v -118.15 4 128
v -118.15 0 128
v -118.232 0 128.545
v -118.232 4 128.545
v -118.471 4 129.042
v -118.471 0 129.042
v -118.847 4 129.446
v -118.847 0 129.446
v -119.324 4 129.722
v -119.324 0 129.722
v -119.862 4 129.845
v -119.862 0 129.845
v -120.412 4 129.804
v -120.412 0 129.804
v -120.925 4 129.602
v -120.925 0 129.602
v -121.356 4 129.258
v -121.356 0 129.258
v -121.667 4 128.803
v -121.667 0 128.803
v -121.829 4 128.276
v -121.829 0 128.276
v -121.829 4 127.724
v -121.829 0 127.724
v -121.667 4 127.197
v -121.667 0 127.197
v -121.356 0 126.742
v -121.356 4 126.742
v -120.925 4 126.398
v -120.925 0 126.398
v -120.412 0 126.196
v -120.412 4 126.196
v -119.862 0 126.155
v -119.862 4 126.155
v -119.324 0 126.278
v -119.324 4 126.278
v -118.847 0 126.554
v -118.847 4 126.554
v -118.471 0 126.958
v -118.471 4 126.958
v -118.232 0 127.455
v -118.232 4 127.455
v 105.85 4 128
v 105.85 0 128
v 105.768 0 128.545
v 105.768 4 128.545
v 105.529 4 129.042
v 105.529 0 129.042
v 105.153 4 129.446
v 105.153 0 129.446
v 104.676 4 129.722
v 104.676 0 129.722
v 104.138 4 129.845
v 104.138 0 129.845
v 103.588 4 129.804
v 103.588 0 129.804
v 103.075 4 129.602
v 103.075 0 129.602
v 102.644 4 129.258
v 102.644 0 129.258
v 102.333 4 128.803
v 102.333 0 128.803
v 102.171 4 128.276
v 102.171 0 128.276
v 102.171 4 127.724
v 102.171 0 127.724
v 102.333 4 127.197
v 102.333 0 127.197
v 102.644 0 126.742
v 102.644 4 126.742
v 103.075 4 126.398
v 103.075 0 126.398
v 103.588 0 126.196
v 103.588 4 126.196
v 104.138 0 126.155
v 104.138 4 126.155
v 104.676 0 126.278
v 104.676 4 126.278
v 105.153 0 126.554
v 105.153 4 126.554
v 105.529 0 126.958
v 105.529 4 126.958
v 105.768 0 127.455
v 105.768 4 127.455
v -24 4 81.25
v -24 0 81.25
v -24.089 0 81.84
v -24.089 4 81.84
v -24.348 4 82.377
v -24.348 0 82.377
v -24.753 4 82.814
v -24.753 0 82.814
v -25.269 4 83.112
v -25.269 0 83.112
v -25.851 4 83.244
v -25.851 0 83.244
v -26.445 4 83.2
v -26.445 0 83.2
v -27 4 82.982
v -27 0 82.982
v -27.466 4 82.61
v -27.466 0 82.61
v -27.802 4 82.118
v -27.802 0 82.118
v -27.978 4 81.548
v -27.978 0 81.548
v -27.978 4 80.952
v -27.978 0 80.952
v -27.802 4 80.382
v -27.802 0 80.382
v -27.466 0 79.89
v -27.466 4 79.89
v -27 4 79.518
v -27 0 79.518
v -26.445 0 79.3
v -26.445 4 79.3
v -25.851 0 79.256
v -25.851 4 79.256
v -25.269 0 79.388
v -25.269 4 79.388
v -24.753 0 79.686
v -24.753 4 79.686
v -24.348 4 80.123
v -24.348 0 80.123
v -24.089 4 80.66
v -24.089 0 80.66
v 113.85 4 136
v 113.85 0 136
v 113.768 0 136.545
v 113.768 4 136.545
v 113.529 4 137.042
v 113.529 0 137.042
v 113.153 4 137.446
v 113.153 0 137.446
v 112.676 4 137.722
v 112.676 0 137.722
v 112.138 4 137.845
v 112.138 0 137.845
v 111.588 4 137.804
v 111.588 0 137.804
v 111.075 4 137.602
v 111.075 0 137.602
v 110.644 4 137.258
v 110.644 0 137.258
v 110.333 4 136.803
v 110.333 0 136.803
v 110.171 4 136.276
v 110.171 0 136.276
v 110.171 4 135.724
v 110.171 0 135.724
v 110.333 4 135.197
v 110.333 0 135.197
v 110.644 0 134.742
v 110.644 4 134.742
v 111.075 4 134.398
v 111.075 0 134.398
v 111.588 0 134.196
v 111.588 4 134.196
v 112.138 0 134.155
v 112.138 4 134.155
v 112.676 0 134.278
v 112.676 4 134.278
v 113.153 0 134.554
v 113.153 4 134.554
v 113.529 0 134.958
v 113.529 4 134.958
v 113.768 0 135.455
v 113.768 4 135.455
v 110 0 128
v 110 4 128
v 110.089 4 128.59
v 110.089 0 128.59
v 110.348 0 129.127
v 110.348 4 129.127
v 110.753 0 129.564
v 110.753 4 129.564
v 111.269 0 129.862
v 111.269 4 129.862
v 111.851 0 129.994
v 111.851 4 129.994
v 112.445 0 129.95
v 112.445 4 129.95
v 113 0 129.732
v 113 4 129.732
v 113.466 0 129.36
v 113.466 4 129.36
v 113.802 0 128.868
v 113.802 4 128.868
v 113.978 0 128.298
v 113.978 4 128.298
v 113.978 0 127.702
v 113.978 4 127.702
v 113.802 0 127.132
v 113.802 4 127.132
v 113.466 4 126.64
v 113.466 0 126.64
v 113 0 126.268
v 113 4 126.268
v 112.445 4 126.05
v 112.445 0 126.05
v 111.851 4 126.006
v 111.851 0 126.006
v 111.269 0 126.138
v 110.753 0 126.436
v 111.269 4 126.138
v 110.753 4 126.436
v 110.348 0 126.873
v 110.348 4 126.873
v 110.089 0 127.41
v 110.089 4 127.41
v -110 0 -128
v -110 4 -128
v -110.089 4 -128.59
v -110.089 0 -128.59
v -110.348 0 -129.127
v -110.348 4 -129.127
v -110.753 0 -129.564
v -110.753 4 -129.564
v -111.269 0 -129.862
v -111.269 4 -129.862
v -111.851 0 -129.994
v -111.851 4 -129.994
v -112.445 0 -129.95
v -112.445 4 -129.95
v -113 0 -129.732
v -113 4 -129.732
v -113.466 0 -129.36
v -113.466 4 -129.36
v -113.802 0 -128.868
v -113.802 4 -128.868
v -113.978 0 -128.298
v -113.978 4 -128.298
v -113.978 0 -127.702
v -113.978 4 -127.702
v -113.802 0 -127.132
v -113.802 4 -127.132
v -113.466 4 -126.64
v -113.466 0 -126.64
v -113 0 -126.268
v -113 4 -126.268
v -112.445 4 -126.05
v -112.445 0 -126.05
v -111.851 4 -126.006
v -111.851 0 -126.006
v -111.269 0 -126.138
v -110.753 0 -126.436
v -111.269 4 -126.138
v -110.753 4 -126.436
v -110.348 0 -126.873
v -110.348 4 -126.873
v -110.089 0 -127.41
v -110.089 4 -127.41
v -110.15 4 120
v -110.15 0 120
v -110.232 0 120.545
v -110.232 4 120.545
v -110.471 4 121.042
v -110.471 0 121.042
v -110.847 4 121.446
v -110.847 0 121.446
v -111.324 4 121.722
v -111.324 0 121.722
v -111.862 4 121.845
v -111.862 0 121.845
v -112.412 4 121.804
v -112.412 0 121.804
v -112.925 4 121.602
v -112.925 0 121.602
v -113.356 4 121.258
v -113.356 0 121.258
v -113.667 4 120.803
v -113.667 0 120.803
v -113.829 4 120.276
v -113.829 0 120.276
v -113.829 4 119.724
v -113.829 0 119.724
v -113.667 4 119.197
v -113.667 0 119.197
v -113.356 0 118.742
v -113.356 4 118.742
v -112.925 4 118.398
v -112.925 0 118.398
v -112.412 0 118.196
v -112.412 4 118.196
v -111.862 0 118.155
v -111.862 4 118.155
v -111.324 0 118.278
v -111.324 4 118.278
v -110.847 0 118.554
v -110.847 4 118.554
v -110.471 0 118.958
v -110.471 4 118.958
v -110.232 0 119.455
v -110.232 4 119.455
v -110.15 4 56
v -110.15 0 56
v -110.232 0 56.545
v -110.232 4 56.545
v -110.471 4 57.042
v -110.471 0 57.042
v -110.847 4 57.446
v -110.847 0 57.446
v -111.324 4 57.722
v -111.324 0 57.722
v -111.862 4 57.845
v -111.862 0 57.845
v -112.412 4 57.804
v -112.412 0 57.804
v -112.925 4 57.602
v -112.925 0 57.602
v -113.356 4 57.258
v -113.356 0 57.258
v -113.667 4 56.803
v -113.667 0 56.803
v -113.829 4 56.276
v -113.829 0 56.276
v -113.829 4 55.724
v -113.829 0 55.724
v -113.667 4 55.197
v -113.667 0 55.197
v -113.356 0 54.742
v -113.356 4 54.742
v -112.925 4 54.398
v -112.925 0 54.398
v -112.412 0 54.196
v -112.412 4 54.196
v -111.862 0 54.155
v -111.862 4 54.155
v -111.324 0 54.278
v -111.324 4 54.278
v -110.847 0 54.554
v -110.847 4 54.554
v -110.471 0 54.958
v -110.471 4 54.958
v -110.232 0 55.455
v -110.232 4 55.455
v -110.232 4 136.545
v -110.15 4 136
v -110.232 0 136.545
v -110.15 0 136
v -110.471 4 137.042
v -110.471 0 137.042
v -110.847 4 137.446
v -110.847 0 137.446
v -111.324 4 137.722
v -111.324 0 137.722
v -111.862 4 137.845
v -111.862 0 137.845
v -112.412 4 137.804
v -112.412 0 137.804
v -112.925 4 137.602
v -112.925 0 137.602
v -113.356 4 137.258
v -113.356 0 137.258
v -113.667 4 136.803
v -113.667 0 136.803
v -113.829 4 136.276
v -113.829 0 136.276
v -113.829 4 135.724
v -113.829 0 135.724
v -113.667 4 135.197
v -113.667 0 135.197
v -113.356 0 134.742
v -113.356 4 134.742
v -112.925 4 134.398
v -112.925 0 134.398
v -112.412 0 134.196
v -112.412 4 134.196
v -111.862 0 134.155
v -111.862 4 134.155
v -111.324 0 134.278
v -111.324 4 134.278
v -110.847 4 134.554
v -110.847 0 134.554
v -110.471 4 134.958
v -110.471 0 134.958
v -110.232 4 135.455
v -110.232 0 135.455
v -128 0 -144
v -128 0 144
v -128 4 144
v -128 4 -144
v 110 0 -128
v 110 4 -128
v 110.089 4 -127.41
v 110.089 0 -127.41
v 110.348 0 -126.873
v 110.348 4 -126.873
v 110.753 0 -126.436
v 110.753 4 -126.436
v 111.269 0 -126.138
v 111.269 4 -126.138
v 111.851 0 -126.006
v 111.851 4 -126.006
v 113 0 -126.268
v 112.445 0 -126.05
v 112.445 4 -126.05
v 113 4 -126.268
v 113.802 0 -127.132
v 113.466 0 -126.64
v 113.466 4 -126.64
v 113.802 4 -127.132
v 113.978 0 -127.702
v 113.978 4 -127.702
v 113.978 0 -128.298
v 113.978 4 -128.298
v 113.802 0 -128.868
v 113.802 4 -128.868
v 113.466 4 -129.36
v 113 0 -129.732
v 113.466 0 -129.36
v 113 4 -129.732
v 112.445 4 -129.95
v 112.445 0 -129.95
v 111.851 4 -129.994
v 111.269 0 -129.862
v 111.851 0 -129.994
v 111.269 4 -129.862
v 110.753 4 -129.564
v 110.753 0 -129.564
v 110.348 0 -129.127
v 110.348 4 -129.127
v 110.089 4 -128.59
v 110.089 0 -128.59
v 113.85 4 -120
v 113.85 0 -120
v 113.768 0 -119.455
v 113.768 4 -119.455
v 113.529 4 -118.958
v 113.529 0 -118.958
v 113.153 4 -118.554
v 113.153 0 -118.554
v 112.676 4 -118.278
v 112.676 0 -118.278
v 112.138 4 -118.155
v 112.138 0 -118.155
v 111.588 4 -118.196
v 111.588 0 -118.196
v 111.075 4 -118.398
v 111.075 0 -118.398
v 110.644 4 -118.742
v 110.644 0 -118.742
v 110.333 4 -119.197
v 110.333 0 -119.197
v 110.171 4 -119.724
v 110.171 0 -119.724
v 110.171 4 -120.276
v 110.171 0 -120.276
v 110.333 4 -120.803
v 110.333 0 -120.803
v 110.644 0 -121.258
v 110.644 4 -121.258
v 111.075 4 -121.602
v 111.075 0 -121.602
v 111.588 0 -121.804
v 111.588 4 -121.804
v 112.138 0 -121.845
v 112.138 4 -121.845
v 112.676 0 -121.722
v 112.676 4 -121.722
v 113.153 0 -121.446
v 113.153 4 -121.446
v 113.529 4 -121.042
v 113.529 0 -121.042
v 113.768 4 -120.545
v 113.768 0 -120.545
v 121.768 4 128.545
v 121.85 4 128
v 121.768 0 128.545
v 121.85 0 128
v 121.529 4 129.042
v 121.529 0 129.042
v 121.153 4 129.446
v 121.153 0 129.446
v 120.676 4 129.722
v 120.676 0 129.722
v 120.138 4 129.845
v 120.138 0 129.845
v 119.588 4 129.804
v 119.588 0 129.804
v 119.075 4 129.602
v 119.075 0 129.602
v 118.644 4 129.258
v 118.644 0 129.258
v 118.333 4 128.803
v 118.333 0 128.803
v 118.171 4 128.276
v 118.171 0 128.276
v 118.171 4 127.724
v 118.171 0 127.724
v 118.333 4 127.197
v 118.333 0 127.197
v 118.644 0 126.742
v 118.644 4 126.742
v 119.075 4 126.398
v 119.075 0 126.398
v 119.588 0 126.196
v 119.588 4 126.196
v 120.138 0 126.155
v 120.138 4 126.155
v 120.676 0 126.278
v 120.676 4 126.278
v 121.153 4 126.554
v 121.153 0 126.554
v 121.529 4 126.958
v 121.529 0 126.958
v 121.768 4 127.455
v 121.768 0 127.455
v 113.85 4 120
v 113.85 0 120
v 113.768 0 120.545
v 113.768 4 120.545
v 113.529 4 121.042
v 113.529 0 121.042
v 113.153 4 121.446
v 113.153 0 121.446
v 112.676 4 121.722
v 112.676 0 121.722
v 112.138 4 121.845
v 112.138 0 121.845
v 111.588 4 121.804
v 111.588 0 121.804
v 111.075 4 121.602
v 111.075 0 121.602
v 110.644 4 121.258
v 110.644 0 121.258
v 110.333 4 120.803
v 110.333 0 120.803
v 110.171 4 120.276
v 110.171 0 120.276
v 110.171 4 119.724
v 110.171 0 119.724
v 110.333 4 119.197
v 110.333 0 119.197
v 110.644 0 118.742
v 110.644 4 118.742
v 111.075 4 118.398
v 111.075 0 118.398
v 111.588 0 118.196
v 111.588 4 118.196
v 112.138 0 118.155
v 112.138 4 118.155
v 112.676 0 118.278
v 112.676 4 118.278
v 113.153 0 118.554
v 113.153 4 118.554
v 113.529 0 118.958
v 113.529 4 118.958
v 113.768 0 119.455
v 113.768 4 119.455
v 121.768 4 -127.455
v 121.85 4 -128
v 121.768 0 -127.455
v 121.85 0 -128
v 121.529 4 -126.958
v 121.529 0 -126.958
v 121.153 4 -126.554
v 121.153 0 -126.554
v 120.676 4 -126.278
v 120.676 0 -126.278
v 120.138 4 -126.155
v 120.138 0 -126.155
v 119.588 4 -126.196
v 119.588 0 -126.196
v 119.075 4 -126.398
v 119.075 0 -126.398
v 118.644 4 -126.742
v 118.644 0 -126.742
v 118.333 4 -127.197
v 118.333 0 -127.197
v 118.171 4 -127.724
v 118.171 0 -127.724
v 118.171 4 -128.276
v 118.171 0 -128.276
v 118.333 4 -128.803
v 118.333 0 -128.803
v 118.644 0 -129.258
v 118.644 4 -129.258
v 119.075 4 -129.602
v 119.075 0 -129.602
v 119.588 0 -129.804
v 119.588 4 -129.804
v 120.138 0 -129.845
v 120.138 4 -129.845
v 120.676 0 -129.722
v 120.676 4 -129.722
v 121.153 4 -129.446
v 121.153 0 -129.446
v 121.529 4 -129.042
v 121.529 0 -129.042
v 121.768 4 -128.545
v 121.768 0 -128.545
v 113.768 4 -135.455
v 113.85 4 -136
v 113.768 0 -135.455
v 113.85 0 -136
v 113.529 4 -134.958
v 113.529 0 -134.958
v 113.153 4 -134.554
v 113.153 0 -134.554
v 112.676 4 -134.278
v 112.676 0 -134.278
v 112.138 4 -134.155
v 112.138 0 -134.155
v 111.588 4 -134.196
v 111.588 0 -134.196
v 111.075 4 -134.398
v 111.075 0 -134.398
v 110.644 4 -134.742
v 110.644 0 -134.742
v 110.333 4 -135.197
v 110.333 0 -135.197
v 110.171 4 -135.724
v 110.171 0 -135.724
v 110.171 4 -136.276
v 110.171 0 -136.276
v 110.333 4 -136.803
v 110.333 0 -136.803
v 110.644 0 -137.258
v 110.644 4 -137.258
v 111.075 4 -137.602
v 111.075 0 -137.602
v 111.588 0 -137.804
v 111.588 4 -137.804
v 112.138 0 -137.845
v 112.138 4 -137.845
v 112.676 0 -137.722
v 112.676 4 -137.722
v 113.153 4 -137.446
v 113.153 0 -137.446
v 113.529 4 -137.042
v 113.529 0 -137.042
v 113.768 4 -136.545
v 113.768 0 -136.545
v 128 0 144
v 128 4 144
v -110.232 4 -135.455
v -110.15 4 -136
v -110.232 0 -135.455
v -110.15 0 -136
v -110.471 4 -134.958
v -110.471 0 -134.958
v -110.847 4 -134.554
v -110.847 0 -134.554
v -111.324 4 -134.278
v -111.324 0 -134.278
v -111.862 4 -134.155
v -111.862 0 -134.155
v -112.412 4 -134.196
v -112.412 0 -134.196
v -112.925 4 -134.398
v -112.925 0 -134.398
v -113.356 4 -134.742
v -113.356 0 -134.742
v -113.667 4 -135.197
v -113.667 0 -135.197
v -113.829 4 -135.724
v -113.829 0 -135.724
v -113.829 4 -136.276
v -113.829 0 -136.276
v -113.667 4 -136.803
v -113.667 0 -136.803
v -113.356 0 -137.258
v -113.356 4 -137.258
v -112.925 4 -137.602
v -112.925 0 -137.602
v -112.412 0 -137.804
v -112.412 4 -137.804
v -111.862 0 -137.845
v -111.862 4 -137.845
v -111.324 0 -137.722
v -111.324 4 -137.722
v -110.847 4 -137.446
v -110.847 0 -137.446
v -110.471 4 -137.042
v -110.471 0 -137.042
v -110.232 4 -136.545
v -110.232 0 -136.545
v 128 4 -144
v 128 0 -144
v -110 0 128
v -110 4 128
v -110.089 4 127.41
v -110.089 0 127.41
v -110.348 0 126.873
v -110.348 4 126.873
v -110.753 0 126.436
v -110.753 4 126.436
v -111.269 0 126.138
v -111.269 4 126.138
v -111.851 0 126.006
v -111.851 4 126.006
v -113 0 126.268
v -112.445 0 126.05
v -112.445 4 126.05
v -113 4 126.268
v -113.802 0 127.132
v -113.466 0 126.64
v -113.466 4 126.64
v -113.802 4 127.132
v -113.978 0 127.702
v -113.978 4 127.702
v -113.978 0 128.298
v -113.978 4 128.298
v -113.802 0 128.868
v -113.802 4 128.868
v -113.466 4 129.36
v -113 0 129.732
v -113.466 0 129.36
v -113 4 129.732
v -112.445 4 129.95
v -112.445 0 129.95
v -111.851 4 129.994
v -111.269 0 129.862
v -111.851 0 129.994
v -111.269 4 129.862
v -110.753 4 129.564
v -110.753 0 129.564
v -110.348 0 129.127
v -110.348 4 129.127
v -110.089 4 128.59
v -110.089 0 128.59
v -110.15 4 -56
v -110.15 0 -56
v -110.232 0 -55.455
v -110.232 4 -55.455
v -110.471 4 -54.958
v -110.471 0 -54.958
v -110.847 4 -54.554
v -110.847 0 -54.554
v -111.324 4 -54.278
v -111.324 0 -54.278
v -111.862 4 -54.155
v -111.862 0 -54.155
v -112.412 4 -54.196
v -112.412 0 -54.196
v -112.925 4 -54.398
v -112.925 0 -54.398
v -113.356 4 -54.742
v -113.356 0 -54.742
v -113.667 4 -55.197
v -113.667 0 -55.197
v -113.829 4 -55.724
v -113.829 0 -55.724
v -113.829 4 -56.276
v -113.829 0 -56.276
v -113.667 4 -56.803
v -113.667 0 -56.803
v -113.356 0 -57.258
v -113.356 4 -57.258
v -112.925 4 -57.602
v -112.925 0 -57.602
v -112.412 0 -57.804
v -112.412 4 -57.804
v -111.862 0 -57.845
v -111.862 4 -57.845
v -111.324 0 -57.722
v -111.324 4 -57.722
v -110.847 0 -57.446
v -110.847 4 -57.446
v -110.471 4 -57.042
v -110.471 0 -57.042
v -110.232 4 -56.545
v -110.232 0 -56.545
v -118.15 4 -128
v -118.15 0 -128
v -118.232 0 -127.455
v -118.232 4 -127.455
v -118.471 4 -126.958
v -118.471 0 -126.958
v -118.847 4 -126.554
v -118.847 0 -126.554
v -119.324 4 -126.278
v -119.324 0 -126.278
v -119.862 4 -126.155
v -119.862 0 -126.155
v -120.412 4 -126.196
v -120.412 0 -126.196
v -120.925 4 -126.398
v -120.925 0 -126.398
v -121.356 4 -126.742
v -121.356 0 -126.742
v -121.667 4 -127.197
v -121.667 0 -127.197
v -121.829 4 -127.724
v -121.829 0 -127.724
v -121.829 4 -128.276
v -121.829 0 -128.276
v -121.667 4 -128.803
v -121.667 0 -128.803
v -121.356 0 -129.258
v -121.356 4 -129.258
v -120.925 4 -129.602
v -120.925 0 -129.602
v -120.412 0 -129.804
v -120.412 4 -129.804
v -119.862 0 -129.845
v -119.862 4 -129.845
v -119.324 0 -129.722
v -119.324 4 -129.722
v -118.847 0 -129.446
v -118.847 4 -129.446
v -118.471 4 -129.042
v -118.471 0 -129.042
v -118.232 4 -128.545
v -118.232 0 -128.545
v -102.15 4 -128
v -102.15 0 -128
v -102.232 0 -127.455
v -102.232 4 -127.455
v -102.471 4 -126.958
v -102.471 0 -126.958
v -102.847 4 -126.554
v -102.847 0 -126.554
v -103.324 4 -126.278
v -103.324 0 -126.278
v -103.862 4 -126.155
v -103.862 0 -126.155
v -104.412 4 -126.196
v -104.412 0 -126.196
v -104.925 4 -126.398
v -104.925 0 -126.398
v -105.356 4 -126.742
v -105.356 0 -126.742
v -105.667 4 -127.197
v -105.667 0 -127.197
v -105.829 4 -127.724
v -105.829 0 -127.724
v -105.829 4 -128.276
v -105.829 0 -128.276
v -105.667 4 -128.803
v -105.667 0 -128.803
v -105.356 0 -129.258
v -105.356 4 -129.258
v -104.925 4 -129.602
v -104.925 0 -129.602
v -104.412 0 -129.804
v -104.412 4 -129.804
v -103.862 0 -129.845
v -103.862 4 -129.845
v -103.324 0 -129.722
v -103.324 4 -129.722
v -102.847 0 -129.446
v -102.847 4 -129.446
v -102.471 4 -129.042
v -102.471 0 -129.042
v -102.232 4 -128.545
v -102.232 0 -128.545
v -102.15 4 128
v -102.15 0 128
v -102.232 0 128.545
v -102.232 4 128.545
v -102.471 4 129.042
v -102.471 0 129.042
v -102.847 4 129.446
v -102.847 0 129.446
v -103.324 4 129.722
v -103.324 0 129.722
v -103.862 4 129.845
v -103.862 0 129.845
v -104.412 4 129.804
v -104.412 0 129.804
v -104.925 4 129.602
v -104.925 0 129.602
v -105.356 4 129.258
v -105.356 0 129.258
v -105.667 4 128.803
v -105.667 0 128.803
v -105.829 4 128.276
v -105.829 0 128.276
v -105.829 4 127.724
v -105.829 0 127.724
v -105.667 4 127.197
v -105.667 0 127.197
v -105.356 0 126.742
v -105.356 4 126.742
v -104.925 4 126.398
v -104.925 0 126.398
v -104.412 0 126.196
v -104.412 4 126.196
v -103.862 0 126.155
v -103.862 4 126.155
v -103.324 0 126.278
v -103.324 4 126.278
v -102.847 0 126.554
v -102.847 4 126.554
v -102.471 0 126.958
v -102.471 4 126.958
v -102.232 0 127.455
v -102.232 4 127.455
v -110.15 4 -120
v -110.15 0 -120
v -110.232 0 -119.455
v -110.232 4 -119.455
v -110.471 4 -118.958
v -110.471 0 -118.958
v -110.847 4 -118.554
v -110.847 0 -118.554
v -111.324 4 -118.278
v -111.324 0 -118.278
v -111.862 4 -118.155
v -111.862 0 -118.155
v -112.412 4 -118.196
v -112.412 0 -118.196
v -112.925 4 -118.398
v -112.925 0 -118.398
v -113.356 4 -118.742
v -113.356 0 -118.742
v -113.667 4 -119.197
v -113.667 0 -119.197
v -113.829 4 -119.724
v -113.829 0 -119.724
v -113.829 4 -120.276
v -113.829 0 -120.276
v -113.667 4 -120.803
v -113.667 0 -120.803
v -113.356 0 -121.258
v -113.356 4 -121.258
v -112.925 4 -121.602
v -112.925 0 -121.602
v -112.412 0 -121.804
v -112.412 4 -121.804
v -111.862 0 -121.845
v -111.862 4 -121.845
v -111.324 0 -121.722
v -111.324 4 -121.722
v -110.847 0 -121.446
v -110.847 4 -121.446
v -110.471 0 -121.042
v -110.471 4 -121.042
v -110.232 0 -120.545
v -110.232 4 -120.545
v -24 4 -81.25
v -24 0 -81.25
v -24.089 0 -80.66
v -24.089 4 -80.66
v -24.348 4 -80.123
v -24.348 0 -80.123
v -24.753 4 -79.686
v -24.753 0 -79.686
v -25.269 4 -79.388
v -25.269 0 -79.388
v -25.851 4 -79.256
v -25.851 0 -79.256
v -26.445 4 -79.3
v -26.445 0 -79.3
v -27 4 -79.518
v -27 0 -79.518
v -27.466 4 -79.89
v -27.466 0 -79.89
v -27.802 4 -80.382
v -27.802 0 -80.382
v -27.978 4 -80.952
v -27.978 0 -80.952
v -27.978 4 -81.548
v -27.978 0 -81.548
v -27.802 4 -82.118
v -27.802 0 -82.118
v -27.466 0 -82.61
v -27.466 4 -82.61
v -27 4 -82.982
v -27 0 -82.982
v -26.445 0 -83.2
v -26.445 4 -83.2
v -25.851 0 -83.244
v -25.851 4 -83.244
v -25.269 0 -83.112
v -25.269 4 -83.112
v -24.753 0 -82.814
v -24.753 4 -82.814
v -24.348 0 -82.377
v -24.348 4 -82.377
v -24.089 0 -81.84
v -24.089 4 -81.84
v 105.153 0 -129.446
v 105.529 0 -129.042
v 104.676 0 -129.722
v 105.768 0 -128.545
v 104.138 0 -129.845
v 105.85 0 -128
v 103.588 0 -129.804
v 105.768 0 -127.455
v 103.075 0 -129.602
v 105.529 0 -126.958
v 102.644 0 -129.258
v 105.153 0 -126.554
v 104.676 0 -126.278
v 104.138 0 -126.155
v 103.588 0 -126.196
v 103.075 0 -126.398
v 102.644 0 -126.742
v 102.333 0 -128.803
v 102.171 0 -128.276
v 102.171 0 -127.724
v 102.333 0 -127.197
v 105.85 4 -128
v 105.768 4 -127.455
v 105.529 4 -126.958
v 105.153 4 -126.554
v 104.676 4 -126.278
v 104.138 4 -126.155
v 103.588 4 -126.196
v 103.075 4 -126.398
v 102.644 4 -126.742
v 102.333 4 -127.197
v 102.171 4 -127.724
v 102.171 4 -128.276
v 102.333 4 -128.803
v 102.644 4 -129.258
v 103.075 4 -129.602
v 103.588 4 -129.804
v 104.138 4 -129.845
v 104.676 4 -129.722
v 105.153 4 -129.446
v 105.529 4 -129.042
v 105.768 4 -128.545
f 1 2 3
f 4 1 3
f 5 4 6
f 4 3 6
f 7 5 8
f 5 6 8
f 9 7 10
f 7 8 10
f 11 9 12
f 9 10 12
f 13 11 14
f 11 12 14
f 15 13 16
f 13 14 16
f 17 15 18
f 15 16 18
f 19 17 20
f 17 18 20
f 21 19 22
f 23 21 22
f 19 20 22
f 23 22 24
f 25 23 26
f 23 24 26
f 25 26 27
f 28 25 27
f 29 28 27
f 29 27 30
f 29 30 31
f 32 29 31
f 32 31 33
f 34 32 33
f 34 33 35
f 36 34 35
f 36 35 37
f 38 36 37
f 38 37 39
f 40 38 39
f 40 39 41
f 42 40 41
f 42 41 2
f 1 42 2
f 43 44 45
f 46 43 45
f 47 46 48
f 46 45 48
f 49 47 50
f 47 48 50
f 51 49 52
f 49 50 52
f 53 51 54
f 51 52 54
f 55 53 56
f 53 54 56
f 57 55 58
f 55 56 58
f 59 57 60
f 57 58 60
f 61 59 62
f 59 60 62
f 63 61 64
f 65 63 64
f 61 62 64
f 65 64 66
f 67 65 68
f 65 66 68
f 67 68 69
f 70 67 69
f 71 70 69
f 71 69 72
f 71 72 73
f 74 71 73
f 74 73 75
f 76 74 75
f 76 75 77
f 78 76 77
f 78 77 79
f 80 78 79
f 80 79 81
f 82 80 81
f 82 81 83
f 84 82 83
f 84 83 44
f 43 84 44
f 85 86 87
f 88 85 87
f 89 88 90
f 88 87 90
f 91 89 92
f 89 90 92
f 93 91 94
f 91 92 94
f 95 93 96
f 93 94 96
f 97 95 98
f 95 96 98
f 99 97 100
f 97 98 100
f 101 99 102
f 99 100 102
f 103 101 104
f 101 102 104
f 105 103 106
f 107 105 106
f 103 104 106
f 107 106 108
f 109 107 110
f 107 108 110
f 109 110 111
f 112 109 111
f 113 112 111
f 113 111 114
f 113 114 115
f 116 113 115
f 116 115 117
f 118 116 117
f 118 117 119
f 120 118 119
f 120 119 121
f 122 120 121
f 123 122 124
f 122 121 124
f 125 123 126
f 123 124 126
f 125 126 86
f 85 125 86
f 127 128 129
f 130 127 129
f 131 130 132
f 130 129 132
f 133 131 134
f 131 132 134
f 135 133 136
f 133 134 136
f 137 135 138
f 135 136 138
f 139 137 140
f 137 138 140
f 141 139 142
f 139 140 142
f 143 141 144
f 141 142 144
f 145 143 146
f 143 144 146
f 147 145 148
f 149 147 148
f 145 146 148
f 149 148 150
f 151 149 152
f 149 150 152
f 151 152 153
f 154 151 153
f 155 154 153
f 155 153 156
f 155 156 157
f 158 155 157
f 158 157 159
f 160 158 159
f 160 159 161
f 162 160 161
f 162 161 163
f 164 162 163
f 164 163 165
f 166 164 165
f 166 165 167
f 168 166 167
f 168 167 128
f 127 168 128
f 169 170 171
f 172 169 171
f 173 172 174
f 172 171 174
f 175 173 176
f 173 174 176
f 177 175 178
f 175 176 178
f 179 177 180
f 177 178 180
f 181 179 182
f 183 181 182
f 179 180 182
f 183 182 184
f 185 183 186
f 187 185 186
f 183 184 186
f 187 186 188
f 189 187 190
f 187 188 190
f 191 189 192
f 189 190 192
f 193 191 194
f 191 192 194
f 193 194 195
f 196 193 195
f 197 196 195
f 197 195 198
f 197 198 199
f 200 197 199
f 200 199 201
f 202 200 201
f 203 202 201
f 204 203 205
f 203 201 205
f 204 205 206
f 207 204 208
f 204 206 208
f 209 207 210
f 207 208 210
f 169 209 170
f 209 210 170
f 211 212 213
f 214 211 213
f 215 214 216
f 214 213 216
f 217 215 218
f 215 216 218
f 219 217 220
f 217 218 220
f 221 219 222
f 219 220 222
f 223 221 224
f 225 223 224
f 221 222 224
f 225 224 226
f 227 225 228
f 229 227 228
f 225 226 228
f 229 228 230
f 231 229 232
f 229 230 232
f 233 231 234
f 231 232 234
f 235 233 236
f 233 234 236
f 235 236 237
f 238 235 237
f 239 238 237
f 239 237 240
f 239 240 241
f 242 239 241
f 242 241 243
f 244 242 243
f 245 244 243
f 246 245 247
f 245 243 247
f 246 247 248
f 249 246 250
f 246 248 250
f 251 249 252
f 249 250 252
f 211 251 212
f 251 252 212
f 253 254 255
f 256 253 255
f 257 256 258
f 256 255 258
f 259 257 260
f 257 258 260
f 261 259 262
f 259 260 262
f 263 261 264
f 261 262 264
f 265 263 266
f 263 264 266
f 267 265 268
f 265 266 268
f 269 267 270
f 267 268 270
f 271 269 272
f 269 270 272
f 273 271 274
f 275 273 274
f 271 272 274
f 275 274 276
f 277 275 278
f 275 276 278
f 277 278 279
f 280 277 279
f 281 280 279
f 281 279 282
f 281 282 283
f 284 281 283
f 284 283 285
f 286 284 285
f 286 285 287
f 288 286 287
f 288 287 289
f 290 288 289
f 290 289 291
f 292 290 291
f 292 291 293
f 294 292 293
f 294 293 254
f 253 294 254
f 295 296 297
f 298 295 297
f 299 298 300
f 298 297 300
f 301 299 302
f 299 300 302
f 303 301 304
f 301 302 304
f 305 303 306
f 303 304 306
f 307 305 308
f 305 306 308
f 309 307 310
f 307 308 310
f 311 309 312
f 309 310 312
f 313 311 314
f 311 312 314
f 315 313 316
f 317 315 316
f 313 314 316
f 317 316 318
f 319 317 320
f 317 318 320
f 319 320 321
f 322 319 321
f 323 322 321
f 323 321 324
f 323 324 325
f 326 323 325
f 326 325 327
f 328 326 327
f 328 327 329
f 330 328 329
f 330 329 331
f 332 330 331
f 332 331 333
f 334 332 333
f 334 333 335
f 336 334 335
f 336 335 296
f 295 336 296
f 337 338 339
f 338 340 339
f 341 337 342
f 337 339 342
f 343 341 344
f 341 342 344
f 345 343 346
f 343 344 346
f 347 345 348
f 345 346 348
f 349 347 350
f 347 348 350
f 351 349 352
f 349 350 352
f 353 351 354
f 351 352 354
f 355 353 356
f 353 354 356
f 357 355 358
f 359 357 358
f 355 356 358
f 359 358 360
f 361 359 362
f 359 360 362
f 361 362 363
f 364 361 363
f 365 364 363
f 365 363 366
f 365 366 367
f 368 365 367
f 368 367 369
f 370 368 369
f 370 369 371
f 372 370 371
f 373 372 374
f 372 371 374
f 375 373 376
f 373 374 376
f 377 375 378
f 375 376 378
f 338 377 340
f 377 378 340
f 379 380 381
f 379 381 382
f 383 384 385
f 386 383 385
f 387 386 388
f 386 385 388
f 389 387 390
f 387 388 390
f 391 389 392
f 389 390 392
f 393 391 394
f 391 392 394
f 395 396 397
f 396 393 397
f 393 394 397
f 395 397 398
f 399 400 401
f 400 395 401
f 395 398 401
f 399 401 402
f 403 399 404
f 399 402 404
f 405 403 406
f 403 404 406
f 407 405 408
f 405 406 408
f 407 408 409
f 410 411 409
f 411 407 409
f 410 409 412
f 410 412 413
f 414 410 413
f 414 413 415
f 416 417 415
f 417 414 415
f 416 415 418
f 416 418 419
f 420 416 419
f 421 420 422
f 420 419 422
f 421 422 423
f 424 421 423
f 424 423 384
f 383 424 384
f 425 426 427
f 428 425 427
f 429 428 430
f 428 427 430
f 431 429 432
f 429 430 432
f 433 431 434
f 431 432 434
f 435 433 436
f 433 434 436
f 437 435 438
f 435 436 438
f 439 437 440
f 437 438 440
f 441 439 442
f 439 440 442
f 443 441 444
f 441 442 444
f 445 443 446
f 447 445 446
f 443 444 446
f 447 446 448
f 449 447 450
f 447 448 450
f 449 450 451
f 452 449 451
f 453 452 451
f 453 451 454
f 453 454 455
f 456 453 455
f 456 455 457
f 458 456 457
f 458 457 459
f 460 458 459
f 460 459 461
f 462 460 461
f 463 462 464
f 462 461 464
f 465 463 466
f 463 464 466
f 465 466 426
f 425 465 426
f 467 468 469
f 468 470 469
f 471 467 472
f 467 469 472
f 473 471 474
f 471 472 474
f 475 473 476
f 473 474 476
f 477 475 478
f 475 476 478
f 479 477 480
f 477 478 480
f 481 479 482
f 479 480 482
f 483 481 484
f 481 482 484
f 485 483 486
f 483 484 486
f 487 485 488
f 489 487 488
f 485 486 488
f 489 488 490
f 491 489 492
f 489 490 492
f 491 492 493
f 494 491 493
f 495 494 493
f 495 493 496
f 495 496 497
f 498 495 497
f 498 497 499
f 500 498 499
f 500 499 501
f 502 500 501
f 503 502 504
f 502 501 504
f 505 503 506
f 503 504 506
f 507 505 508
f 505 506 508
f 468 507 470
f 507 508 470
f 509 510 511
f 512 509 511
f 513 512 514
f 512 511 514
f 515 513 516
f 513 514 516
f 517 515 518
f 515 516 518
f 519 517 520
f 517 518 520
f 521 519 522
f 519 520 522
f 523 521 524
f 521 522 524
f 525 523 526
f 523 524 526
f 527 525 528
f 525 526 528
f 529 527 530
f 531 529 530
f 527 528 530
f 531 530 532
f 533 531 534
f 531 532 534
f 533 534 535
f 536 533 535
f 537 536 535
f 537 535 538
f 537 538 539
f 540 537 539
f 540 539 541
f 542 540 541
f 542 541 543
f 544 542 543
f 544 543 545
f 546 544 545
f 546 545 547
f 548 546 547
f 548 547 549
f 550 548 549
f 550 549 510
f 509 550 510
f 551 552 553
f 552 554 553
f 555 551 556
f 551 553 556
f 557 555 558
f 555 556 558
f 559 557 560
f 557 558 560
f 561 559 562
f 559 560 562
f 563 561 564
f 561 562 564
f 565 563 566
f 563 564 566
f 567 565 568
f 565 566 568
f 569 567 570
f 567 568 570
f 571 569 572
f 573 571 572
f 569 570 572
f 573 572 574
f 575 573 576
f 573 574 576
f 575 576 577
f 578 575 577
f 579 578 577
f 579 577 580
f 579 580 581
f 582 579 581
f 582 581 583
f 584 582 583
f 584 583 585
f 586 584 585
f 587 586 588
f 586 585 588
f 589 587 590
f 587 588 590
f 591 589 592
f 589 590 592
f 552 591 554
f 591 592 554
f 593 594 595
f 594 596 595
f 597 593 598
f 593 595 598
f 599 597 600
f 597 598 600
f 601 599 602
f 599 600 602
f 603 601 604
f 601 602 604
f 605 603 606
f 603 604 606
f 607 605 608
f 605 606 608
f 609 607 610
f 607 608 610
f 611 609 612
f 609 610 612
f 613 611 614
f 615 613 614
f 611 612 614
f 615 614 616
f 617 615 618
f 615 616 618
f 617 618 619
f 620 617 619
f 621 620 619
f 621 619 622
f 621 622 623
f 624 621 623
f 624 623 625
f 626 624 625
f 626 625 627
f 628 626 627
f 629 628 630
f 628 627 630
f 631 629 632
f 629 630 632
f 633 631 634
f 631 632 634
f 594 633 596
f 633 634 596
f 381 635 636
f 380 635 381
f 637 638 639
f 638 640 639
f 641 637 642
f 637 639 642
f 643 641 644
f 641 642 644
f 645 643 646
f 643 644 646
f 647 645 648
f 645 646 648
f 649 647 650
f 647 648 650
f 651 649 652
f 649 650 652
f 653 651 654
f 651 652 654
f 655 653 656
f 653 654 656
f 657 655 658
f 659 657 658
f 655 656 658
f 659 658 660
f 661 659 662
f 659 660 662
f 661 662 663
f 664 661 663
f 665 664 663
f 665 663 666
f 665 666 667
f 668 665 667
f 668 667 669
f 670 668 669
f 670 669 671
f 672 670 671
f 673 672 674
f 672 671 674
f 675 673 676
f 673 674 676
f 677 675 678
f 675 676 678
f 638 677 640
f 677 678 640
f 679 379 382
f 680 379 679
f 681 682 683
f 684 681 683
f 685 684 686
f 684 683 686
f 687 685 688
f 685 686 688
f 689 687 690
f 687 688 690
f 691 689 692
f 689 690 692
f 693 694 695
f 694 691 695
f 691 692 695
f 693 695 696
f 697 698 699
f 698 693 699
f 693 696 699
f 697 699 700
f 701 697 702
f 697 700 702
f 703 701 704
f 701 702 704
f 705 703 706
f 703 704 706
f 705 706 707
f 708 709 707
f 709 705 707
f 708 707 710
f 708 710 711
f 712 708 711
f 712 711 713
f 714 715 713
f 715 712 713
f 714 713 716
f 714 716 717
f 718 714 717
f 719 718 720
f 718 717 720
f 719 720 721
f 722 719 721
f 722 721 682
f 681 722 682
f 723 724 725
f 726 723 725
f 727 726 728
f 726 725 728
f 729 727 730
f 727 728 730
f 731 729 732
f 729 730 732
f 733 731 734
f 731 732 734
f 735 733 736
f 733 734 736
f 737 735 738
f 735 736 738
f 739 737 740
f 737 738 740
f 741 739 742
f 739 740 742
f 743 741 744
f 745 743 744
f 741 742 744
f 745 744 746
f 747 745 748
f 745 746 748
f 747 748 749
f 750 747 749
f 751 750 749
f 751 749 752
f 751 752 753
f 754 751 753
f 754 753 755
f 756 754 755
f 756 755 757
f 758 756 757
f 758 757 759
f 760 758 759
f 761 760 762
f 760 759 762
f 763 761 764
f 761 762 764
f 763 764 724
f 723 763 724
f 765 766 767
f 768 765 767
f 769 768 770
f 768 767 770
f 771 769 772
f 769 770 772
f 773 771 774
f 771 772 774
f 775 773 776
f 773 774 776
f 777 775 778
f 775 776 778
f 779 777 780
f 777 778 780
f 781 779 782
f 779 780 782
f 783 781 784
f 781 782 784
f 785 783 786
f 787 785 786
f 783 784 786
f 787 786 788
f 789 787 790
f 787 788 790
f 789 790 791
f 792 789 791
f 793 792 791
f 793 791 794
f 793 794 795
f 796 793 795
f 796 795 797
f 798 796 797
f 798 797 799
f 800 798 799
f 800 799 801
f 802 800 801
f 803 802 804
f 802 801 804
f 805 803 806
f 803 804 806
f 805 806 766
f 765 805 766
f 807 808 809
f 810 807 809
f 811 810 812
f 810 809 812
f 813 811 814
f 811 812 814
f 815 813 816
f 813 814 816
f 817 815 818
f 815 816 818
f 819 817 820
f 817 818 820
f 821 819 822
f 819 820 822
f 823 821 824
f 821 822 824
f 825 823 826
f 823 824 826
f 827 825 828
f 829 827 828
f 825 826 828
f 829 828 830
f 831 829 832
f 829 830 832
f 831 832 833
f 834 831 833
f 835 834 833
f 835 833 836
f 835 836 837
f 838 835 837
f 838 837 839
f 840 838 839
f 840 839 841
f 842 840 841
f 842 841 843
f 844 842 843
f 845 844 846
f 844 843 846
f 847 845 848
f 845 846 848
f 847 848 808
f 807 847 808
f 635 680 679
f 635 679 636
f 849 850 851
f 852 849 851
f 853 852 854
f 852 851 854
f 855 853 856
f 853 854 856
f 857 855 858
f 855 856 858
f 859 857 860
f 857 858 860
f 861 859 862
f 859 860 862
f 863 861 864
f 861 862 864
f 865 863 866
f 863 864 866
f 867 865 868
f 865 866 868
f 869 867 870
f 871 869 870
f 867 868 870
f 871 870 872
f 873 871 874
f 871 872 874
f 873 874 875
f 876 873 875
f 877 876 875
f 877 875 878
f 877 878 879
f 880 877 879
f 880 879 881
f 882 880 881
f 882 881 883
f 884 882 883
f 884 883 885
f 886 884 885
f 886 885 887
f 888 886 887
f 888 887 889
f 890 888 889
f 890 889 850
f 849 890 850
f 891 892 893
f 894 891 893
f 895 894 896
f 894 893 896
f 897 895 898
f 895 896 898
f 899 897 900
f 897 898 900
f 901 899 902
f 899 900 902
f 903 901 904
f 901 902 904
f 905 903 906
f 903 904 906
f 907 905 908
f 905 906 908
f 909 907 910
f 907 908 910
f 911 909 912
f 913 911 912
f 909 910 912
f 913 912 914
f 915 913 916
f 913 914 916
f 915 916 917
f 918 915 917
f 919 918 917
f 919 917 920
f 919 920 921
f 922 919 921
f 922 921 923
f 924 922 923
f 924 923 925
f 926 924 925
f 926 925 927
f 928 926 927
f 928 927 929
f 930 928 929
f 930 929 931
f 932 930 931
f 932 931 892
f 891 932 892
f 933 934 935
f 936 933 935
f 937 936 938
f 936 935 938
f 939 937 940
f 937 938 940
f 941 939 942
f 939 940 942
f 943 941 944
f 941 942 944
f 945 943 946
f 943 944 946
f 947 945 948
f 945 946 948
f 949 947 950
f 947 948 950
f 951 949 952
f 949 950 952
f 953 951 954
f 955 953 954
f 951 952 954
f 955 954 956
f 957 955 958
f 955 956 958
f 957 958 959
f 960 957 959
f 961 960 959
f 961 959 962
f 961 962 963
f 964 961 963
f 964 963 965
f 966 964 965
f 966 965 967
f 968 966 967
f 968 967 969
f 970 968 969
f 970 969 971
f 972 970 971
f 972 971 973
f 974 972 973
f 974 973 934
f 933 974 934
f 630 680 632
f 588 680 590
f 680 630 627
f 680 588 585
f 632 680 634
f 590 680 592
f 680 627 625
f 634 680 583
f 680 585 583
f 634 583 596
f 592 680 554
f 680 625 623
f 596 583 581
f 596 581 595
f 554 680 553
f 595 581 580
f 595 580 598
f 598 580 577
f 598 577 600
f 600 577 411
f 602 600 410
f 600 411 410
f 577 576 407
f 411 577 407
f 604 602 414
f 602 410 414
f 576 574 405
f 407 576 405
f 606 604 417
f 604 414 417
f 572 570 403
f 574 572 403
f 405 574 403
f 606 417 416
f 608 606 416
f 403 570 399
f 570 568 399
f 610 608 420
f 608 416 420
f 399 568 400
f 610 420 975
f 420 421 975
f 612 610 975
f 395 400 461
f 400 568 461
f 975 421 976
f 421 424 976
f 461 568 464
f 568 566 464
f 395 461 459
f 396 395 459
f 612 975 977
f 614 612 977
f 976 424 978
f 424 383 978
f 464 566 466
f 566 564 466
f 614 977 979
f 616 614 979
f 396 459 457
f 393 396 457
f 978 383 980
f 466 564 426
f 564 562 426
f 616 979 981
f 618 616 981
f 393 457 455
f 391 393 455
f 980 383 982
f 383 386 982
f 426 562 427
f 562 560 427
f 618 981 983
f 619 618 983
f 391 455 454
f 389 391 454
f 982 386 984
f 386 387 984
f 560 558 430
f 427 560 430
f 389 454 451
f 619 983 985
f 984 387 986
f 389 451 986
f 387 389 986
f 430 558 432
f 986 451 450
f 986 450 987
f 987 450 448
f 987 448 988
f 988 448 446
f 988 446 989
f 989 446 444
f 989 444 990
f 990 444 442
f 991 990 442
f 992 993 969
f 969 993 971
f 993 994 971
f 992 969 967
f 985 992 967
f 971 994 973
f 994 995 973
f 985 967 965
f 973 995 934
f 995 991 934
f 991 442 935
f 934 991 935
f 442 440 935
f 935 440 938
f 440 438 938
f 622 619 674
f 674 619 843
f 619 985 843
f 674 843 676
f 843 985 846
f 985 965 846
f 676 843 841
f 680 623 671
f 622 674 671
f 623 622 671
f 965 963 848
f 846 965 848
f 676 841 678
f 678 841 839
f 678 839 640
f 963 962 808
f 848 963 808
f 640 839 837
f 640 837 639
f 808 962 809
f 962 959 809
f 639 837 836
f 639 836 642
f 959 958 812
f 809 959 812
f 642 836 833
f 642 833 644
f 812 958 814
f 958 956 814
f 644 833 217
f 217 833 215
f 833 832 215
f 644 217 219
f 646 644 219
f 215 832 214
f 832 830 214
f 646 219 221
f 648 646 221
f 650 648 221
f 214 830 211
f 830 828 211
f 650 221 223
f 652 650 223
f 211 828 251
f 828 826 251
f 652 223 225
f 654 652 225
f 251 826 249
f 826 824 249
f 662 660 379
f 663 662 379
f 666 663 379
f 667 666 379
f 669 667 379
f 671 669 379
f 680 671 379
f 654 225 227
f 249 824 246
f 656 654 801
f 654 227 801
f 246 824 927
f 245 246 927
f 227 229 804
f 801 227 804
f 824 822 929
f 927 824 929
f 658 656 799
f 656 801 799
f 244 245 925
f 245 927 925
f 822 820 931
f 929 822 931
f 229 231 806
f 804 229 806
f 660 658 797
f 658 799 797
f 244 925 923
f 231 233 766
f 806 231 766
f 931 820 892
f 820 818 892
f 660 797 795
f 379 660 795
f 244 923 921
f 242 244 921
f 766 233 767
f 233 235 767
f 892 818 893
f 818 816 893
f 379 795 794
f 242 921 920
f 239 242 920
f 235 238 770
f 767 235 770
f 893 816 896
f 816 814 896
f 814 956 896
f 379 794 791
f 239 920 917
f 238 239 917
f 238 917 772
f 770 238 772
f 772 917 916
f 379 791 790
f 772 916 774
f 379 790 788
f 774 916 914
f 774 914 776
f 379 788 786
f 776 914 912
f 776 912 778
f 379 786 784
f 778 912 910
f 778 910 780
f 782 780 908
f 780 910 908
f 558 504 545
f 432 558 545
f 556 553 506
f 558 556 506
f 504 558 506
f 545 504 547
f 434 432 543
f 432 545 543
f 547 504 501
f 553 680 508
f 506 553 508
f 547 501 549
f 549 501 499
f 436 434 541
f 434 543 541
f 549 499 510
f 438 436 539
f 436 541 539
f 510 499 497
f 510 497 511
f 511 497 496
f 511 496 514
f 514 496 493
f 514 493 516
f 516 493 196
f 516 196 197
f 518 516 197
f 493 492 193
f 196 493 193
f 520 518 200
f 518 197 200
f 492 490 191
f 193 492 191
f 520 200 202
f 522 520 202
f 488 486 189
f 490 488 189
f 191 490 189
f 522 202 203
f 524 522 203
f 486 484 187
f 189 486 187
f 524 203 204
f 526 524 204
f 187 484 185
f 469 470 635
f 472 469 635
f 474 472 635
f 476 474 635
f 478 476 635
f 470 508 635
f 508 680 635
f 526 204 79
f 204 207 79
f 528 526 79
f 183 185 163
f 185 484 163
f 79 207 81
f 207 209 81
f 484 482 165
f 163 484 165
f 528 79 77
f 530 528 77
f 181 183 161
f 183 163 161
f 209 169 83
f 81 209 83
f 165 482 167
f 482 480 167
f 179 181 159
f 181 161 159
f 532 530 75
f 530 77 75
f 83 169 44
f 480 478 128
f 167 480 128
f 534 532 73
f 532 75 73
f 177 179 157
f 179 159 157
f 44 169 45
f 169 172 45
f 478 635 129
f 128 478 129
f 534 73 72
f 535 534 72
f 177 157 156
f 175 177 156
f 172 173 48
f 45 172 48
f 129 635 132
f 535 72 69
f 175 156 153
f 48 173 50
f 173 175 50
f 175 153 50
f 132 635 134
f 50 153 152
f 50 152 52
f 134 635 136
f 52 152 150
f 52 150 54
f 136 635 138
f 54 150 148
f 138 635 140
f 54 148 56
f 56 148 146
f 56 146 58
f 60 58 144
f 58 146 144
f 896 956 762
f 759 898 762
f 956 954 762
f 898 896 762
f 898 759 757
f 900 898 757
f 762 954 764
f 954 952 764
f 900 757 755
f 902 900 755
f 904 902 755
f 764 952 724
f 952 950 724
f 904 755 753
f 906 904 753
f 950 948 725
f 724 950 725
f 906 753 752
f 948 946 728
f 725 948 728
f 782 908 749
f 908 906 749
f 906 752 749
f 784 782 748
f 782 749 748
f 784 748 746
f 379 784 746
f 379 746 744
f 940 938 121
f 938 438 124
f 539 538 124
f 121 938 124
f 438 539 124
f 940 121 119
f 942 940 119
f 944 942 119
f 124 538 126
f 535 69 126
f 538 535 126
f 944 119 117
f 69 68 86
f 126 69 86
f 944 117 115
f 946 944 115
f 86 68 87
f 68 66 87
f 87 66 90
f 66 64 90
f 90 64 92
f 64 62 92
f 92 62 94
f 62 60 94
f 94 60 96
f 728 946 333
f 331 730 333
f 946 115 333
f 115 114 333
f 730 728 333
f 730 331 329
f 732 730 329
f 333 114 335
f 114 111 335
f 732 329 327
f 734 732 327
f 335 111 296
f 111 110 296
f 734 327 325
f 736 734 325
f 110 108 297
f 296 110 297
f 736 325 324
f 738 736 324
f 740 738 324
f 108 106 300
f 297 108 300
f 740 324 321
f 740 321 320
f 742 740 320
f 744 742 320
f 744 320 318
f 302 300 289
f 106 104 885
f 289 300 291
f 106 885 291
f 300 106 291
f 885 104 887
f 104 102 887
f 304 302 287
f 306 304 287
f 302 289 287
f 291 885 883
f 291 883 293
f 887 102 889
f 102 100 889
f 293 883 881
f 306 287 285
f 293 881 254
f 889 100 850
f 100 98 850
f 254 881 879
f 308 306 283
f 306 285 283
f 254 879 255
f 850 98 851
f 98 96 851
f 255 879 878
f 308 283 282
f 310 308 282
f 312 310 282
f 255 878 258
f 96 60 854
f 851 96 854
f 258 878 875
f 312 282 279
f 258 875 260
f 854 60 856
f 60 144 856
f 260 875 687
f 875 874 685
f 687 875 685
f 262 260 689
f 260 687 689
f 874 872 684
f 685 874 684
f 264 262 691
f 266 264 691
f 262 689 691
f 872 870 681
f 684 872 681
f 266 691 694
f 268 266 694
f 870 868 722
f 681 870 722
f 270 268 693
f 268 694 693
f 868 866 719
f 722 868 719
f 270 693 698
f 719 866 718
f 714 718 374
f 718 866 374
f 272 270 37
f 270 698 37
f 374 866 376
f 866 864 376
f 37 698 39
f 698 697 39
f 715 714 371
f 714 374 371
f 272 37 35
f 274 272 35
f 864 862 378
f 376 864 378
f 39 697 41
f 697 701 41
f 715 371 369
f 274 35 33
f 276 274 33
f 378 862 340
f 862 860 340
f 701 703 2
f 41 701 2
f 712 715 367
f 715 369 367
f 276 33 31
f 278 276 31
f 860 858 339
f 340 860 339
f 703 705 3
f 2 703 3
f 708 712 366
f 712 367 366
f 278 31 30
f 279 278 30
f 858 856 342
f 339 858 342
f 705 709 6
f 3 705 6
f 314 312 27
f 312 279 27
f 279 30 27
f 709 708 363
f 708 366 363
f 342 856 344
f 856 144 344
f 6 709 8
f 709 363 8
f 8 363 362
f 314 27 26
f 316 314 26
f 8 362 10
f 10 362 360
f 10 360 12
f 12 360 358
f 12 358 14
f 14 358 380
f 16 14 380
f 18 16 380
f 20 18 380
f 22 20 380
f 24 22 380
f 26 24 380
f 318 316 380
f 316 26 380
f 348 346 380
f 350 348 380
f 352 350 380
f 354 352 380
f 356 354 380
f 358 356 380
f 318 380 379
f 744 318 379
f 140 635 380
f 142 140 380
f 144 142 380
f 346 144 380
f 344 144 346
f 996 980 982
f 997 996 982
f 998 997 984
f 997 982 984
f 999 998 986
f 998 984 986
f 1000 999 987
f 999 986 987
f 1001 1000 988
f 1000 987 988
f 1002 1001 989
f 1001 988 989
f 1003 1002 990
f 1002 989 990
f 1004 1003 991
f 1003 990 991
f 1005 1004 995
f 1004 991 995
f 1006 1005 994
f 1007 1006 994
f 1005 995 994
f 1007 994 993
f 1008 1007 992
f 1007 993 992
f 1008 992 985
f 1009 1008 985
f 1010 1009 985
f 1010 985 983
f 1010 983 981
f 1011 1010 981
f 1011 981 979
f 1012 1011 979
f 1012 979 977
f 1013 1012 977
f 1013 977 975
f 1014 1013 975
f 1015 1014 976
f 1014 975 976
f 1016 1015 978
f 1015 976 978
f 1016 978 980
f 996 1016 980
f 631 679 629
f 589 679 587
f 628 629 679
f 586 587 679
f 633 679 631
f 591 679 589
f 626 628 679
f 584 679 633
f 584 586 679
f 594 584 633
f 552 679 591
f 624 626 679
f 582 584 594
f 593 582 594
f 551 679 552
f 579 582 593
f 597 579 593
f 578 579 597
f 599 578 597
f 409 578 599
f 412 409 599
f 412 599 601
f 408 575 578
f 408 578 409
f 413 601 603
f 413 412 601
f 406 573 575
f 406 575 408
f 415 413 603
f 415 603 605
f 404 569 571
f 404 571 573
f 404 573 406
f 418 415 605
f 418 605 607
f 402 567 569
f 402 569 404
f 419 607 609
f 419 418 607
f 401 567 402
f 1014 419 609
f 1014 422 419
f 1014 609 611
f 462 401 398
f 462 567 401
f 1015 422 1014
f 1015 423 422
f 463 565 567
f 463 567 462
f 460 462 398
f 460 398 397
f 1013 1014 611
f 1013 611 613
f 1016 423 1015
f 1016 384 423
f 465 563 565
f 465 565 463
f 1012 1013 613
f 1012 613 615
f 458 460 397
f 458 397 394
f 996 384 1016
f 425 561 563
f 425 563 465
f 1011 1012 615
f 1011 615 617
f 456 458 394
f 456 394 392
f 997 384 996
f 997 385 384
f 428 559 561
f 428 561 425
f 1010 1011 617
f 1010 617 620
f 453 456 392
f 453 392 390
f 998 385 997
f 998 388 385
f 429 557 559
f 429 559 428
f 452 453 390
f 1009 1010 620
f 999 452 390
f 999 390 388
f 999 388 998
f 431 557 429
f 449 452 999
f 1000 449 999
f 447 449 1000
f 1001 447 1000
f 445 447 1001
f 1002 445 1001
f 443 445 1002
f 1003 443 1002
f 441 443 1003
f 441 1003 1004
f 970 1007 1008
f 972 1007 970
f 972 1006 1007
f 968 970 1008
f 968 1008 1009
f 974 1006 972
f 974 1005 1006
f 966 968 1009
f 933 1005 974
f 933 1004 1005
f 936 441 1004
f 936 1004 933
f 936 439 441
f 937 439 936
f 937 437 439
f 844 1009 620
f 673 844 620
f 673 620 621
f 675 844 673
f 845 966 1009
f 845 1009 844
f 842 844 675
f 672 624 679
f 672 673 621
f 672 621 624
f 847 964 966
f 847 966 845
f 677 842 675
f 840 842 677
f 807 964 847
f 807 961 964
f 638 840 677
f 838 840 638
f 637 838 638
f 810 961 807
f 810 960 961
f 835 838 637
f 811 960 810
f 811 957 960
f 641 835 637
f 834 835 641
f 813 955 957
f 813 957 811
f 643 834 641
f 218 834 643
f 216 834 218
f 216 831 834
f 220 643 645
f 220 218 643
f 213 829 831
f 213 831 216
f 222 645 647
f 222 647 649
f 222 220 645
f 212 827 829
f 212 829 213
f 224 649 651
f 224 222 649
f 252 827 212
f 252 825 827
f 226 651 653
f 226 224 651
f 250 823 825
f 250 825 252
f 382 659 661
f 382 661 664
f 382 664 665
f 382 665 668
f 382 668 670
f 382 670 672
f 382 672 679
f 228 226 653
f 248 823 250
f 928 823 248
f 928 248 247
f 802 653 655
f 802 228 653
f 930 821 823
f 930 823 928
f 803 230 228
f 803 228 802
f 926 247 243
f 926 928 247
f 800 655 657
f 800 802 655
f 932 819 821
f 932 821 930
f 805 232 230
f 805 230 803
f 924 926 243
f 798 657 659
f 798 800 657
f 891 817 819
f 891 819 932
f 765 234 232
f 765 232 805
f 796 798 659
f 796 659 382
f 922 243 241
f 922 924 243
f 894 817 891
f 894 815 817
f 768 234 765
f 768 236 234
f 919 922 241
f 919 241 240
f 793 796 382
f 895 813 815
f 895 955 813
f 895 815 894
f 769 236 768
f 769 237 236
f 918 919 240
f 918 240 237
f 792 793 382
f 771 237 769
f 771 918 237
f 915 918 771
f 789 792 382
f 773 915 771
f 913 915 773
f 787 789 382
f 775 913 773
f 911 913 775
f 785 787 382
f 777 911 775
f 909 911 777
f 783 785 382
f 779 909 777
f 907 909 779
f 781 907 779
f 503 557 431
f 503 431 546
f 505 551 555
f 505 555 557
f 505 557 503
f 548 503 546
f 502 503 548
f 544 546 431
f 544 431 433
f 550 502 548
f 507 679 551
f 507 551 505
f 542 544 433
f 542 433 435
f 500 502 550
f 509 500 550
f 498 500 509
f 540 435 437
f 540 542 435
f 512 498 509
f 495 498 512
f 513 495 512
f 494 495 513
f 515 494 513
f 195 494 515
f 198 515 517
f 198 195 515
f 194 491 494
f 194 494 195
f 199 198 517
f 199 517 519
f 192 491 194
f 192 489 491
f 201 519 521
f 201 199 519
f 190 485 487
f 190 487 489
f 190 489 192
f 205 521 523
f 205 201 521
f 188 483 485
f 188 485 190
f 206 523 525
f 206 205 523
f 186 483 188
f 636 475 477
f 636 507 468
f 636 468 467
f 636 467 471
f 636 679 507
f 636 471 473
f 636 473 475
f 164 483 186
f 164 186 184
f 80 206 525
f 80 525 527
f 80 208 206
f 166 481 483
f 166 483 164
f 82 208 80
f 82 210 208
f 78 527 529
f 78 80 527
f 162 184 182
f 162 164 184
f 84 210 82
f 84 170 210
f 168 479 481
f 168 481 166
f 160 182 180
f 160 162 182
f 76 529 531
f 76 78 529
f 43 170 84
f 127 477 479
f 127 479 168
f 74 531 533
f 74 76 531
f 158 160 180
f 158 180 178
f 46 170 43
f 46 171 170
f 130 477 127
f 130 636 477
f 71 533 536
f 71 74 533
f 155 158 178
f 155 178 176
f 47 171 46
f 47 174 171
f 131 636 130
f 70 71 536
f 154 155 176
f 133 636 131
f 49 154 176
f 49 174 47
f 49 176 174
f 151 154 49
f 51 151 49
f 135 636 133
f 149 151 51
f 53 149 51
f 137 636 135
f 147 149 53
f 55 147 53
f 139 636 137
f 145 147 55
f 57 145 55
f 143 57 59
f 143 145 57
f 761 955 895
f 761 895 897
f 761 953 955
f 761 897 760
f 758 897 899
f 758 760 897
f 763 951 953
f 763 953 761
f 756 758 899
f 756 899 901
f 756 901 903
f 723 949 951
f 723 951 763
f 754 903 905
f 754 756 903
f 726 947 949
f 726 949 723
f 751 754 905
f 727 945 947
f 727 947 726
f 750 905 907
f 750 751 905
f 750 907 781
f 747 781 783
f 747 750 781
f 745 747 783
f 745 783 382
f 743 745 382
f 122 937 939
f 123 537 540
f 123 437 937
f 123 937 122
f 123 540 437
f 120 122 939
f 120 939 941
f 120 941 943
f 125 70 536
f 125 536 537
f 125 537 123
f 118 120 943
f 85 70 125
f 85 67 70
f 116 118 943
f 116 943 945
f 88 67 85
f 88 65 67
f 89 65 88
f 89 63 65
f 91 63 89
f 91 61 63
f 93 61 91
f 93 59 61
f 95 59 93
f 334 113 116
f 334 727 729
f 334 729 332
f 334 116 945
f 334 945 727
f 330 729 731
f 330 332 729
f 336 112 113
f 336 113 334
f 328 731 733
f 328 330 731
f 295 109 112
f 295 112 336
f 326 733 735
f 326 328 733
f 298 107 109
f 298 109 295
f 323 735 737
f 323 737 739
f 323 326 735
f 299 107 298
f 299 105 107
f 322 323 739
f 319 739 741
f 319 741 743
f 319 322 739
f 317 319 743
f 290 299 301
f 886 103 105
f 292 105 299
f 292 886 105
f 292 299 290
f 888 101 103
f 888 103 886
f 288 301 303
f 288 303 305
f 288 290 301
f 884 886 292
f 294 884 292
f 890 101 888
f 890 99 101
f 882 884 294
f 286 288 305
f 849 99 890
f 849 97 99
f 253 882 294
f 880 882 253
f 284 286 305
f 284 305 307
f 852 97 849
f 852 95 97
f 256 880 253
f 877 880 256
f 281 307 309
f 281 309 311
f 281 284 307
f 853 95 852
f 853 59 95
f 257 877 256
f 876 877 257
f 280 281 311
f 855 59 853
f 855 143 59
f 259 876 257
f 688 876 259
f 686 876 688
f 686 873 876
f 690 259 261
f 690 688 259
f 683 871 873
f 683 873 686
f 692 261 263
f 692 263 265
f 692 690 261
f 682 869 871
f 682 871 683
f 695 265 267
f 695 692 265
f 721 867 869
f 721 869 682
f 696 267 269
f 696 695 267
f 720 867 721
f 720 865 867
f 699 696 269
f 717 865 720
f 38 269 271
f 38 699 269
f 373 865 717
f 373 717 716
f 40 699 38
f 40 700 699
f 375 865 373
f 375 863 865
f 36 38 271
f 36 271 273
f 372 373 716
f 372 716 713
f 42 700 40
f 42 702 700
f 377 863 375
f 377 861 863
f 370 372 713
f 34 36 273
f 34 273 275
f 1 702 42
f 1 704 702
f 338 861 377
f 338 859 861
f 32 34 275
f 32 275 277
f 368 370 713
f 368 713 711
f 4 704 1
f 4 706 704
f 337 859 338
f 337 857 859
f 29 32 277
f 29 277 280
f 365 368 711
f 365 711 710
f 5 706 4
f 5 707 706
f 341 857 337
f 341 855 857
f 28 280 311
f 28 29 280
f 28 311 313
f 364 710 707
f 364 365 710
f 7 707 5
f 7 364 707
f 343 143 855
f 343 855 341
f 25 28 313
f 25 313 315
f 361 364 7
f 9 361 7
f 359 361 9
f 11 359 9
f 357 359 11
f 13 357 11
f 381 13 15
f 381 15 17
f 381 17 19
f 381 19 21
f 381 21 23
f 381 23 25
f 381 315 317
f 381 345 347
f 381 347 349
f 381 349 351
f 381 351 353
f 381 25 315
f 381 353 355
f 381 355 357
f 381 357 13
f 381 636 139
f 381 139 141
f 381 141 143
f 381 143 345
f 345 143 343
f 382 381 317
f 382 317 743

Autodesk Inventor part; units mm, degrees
ref_plane "YZ Plane" through (0, 0, 0) normal (1, 0, 0) x (0, 1, 0)
ref_plane "XZ Plane" through (0, 0, 0) normal (0, 1, 0) x (-1, 0, 0)
ref_plane "XY Plane" through (0, 0, 0) normal (0, 0, 1) x (1, 0, 0)
sketch "Эскиз1" plane through (0, 0, 0) normal (0, 1, 0) x (-1, 0, 0)
  line L0 (-128, 144) -> (128, 144)
  line L1 (128, 144) -> (128, -144)
  line L2 (128, -144) -> (-128, -144)
  line L3 (-128, -144) -> (-128, 144)
  line L4 (-128, 144) -> (128, -144) construction
  line L5 (128, 144) -> (-128, -144) construction
  point P0 (0, 0)
  dimension "d0" = 256
  dimension "d1" = 288
extrude "Выдавливание1" add sketch "Эскиз1" along normal blind 4
sketch "Эскиз2" plane through (0, 0, 0) normal (0, -1, 0) x (1, 0, 0)
  circle A0 centre (-26, 81.25) radius 2 projected
  circle A1 centre (-26, -81.25) radius 2 projected
  circle A2 centre (-112, 56) radius 1.85 projected
  circle A3 centre (-112, -56) radius 1.85 projected
  circle A4 centre (120, 128) radius 1.85 projected
  circle A5 centre (112, 120) radius 1.85 projected
  circle A6 centre (104, 128) radius 1.85 projected
  circle A7 centre (112, 136) radius 1.85 projected
  circle A8 centre (-112, 136) radius 1.85 projected
  circle A9 centre (-104, 128) radius 1.85 projected
  circle A10 centre (-112, 120) radius 1.85 projected
  circle A11 centre (-120, 128) radius 1.85 projected
  circle A12 centre (-104, -128) radius 1.85 projected
  circle A13 centre (-120, -128) radius 1.85 projected
  circle A14 centre (-112, -120) radius 1.85 projected
  circle A15 centre (-112, -136) radius 1.85 projected
  circle A16 centre (104, -128) radius 1.85 projected
  circle A17 centre (112, -120) radius 1.85 projected
  circle A18 centre (112, -136) radius 1.85 projected
  circle A19 centre (120, -128) radius 1.85 projected
  point P0 (0, 0)
extrude "Выдавливание2" cut sketch "Эскиз2" against normal blind 4
sketch "Эскиз3" plane through (0, 4, 0) normal (0, 1, 0) x (1, 0, 0)
  circle A0 centre (-112, 136) radius 1.85 projected
  circle A1 centre (-120, 128) radius 1.85 projected
  circle A2 centre (-104, 128) radius 1.85 projected
  circle A3 centre (-112, 120) radius 1.85 projected
  circle A4 centre (-112, 128) radius 2
  point P0 (0, 0)
  dimension "d6" = 4
extrude "Выдавливание3" cut sketch "Эскиз3" against normal blind 4 contours A4
mirror "Зеркальное отражение1" about plane through (0, 0, 0) normal (1, 0, 0) of "Выдавливание3"
mirror "Зеркальное отражение2" about plane through (0, 0, 0) normal (0, 0, 1) of "Выдавливание3", "Зеркальное отражение1"
properties part number "000.001.014 - Грузовая площадка"
